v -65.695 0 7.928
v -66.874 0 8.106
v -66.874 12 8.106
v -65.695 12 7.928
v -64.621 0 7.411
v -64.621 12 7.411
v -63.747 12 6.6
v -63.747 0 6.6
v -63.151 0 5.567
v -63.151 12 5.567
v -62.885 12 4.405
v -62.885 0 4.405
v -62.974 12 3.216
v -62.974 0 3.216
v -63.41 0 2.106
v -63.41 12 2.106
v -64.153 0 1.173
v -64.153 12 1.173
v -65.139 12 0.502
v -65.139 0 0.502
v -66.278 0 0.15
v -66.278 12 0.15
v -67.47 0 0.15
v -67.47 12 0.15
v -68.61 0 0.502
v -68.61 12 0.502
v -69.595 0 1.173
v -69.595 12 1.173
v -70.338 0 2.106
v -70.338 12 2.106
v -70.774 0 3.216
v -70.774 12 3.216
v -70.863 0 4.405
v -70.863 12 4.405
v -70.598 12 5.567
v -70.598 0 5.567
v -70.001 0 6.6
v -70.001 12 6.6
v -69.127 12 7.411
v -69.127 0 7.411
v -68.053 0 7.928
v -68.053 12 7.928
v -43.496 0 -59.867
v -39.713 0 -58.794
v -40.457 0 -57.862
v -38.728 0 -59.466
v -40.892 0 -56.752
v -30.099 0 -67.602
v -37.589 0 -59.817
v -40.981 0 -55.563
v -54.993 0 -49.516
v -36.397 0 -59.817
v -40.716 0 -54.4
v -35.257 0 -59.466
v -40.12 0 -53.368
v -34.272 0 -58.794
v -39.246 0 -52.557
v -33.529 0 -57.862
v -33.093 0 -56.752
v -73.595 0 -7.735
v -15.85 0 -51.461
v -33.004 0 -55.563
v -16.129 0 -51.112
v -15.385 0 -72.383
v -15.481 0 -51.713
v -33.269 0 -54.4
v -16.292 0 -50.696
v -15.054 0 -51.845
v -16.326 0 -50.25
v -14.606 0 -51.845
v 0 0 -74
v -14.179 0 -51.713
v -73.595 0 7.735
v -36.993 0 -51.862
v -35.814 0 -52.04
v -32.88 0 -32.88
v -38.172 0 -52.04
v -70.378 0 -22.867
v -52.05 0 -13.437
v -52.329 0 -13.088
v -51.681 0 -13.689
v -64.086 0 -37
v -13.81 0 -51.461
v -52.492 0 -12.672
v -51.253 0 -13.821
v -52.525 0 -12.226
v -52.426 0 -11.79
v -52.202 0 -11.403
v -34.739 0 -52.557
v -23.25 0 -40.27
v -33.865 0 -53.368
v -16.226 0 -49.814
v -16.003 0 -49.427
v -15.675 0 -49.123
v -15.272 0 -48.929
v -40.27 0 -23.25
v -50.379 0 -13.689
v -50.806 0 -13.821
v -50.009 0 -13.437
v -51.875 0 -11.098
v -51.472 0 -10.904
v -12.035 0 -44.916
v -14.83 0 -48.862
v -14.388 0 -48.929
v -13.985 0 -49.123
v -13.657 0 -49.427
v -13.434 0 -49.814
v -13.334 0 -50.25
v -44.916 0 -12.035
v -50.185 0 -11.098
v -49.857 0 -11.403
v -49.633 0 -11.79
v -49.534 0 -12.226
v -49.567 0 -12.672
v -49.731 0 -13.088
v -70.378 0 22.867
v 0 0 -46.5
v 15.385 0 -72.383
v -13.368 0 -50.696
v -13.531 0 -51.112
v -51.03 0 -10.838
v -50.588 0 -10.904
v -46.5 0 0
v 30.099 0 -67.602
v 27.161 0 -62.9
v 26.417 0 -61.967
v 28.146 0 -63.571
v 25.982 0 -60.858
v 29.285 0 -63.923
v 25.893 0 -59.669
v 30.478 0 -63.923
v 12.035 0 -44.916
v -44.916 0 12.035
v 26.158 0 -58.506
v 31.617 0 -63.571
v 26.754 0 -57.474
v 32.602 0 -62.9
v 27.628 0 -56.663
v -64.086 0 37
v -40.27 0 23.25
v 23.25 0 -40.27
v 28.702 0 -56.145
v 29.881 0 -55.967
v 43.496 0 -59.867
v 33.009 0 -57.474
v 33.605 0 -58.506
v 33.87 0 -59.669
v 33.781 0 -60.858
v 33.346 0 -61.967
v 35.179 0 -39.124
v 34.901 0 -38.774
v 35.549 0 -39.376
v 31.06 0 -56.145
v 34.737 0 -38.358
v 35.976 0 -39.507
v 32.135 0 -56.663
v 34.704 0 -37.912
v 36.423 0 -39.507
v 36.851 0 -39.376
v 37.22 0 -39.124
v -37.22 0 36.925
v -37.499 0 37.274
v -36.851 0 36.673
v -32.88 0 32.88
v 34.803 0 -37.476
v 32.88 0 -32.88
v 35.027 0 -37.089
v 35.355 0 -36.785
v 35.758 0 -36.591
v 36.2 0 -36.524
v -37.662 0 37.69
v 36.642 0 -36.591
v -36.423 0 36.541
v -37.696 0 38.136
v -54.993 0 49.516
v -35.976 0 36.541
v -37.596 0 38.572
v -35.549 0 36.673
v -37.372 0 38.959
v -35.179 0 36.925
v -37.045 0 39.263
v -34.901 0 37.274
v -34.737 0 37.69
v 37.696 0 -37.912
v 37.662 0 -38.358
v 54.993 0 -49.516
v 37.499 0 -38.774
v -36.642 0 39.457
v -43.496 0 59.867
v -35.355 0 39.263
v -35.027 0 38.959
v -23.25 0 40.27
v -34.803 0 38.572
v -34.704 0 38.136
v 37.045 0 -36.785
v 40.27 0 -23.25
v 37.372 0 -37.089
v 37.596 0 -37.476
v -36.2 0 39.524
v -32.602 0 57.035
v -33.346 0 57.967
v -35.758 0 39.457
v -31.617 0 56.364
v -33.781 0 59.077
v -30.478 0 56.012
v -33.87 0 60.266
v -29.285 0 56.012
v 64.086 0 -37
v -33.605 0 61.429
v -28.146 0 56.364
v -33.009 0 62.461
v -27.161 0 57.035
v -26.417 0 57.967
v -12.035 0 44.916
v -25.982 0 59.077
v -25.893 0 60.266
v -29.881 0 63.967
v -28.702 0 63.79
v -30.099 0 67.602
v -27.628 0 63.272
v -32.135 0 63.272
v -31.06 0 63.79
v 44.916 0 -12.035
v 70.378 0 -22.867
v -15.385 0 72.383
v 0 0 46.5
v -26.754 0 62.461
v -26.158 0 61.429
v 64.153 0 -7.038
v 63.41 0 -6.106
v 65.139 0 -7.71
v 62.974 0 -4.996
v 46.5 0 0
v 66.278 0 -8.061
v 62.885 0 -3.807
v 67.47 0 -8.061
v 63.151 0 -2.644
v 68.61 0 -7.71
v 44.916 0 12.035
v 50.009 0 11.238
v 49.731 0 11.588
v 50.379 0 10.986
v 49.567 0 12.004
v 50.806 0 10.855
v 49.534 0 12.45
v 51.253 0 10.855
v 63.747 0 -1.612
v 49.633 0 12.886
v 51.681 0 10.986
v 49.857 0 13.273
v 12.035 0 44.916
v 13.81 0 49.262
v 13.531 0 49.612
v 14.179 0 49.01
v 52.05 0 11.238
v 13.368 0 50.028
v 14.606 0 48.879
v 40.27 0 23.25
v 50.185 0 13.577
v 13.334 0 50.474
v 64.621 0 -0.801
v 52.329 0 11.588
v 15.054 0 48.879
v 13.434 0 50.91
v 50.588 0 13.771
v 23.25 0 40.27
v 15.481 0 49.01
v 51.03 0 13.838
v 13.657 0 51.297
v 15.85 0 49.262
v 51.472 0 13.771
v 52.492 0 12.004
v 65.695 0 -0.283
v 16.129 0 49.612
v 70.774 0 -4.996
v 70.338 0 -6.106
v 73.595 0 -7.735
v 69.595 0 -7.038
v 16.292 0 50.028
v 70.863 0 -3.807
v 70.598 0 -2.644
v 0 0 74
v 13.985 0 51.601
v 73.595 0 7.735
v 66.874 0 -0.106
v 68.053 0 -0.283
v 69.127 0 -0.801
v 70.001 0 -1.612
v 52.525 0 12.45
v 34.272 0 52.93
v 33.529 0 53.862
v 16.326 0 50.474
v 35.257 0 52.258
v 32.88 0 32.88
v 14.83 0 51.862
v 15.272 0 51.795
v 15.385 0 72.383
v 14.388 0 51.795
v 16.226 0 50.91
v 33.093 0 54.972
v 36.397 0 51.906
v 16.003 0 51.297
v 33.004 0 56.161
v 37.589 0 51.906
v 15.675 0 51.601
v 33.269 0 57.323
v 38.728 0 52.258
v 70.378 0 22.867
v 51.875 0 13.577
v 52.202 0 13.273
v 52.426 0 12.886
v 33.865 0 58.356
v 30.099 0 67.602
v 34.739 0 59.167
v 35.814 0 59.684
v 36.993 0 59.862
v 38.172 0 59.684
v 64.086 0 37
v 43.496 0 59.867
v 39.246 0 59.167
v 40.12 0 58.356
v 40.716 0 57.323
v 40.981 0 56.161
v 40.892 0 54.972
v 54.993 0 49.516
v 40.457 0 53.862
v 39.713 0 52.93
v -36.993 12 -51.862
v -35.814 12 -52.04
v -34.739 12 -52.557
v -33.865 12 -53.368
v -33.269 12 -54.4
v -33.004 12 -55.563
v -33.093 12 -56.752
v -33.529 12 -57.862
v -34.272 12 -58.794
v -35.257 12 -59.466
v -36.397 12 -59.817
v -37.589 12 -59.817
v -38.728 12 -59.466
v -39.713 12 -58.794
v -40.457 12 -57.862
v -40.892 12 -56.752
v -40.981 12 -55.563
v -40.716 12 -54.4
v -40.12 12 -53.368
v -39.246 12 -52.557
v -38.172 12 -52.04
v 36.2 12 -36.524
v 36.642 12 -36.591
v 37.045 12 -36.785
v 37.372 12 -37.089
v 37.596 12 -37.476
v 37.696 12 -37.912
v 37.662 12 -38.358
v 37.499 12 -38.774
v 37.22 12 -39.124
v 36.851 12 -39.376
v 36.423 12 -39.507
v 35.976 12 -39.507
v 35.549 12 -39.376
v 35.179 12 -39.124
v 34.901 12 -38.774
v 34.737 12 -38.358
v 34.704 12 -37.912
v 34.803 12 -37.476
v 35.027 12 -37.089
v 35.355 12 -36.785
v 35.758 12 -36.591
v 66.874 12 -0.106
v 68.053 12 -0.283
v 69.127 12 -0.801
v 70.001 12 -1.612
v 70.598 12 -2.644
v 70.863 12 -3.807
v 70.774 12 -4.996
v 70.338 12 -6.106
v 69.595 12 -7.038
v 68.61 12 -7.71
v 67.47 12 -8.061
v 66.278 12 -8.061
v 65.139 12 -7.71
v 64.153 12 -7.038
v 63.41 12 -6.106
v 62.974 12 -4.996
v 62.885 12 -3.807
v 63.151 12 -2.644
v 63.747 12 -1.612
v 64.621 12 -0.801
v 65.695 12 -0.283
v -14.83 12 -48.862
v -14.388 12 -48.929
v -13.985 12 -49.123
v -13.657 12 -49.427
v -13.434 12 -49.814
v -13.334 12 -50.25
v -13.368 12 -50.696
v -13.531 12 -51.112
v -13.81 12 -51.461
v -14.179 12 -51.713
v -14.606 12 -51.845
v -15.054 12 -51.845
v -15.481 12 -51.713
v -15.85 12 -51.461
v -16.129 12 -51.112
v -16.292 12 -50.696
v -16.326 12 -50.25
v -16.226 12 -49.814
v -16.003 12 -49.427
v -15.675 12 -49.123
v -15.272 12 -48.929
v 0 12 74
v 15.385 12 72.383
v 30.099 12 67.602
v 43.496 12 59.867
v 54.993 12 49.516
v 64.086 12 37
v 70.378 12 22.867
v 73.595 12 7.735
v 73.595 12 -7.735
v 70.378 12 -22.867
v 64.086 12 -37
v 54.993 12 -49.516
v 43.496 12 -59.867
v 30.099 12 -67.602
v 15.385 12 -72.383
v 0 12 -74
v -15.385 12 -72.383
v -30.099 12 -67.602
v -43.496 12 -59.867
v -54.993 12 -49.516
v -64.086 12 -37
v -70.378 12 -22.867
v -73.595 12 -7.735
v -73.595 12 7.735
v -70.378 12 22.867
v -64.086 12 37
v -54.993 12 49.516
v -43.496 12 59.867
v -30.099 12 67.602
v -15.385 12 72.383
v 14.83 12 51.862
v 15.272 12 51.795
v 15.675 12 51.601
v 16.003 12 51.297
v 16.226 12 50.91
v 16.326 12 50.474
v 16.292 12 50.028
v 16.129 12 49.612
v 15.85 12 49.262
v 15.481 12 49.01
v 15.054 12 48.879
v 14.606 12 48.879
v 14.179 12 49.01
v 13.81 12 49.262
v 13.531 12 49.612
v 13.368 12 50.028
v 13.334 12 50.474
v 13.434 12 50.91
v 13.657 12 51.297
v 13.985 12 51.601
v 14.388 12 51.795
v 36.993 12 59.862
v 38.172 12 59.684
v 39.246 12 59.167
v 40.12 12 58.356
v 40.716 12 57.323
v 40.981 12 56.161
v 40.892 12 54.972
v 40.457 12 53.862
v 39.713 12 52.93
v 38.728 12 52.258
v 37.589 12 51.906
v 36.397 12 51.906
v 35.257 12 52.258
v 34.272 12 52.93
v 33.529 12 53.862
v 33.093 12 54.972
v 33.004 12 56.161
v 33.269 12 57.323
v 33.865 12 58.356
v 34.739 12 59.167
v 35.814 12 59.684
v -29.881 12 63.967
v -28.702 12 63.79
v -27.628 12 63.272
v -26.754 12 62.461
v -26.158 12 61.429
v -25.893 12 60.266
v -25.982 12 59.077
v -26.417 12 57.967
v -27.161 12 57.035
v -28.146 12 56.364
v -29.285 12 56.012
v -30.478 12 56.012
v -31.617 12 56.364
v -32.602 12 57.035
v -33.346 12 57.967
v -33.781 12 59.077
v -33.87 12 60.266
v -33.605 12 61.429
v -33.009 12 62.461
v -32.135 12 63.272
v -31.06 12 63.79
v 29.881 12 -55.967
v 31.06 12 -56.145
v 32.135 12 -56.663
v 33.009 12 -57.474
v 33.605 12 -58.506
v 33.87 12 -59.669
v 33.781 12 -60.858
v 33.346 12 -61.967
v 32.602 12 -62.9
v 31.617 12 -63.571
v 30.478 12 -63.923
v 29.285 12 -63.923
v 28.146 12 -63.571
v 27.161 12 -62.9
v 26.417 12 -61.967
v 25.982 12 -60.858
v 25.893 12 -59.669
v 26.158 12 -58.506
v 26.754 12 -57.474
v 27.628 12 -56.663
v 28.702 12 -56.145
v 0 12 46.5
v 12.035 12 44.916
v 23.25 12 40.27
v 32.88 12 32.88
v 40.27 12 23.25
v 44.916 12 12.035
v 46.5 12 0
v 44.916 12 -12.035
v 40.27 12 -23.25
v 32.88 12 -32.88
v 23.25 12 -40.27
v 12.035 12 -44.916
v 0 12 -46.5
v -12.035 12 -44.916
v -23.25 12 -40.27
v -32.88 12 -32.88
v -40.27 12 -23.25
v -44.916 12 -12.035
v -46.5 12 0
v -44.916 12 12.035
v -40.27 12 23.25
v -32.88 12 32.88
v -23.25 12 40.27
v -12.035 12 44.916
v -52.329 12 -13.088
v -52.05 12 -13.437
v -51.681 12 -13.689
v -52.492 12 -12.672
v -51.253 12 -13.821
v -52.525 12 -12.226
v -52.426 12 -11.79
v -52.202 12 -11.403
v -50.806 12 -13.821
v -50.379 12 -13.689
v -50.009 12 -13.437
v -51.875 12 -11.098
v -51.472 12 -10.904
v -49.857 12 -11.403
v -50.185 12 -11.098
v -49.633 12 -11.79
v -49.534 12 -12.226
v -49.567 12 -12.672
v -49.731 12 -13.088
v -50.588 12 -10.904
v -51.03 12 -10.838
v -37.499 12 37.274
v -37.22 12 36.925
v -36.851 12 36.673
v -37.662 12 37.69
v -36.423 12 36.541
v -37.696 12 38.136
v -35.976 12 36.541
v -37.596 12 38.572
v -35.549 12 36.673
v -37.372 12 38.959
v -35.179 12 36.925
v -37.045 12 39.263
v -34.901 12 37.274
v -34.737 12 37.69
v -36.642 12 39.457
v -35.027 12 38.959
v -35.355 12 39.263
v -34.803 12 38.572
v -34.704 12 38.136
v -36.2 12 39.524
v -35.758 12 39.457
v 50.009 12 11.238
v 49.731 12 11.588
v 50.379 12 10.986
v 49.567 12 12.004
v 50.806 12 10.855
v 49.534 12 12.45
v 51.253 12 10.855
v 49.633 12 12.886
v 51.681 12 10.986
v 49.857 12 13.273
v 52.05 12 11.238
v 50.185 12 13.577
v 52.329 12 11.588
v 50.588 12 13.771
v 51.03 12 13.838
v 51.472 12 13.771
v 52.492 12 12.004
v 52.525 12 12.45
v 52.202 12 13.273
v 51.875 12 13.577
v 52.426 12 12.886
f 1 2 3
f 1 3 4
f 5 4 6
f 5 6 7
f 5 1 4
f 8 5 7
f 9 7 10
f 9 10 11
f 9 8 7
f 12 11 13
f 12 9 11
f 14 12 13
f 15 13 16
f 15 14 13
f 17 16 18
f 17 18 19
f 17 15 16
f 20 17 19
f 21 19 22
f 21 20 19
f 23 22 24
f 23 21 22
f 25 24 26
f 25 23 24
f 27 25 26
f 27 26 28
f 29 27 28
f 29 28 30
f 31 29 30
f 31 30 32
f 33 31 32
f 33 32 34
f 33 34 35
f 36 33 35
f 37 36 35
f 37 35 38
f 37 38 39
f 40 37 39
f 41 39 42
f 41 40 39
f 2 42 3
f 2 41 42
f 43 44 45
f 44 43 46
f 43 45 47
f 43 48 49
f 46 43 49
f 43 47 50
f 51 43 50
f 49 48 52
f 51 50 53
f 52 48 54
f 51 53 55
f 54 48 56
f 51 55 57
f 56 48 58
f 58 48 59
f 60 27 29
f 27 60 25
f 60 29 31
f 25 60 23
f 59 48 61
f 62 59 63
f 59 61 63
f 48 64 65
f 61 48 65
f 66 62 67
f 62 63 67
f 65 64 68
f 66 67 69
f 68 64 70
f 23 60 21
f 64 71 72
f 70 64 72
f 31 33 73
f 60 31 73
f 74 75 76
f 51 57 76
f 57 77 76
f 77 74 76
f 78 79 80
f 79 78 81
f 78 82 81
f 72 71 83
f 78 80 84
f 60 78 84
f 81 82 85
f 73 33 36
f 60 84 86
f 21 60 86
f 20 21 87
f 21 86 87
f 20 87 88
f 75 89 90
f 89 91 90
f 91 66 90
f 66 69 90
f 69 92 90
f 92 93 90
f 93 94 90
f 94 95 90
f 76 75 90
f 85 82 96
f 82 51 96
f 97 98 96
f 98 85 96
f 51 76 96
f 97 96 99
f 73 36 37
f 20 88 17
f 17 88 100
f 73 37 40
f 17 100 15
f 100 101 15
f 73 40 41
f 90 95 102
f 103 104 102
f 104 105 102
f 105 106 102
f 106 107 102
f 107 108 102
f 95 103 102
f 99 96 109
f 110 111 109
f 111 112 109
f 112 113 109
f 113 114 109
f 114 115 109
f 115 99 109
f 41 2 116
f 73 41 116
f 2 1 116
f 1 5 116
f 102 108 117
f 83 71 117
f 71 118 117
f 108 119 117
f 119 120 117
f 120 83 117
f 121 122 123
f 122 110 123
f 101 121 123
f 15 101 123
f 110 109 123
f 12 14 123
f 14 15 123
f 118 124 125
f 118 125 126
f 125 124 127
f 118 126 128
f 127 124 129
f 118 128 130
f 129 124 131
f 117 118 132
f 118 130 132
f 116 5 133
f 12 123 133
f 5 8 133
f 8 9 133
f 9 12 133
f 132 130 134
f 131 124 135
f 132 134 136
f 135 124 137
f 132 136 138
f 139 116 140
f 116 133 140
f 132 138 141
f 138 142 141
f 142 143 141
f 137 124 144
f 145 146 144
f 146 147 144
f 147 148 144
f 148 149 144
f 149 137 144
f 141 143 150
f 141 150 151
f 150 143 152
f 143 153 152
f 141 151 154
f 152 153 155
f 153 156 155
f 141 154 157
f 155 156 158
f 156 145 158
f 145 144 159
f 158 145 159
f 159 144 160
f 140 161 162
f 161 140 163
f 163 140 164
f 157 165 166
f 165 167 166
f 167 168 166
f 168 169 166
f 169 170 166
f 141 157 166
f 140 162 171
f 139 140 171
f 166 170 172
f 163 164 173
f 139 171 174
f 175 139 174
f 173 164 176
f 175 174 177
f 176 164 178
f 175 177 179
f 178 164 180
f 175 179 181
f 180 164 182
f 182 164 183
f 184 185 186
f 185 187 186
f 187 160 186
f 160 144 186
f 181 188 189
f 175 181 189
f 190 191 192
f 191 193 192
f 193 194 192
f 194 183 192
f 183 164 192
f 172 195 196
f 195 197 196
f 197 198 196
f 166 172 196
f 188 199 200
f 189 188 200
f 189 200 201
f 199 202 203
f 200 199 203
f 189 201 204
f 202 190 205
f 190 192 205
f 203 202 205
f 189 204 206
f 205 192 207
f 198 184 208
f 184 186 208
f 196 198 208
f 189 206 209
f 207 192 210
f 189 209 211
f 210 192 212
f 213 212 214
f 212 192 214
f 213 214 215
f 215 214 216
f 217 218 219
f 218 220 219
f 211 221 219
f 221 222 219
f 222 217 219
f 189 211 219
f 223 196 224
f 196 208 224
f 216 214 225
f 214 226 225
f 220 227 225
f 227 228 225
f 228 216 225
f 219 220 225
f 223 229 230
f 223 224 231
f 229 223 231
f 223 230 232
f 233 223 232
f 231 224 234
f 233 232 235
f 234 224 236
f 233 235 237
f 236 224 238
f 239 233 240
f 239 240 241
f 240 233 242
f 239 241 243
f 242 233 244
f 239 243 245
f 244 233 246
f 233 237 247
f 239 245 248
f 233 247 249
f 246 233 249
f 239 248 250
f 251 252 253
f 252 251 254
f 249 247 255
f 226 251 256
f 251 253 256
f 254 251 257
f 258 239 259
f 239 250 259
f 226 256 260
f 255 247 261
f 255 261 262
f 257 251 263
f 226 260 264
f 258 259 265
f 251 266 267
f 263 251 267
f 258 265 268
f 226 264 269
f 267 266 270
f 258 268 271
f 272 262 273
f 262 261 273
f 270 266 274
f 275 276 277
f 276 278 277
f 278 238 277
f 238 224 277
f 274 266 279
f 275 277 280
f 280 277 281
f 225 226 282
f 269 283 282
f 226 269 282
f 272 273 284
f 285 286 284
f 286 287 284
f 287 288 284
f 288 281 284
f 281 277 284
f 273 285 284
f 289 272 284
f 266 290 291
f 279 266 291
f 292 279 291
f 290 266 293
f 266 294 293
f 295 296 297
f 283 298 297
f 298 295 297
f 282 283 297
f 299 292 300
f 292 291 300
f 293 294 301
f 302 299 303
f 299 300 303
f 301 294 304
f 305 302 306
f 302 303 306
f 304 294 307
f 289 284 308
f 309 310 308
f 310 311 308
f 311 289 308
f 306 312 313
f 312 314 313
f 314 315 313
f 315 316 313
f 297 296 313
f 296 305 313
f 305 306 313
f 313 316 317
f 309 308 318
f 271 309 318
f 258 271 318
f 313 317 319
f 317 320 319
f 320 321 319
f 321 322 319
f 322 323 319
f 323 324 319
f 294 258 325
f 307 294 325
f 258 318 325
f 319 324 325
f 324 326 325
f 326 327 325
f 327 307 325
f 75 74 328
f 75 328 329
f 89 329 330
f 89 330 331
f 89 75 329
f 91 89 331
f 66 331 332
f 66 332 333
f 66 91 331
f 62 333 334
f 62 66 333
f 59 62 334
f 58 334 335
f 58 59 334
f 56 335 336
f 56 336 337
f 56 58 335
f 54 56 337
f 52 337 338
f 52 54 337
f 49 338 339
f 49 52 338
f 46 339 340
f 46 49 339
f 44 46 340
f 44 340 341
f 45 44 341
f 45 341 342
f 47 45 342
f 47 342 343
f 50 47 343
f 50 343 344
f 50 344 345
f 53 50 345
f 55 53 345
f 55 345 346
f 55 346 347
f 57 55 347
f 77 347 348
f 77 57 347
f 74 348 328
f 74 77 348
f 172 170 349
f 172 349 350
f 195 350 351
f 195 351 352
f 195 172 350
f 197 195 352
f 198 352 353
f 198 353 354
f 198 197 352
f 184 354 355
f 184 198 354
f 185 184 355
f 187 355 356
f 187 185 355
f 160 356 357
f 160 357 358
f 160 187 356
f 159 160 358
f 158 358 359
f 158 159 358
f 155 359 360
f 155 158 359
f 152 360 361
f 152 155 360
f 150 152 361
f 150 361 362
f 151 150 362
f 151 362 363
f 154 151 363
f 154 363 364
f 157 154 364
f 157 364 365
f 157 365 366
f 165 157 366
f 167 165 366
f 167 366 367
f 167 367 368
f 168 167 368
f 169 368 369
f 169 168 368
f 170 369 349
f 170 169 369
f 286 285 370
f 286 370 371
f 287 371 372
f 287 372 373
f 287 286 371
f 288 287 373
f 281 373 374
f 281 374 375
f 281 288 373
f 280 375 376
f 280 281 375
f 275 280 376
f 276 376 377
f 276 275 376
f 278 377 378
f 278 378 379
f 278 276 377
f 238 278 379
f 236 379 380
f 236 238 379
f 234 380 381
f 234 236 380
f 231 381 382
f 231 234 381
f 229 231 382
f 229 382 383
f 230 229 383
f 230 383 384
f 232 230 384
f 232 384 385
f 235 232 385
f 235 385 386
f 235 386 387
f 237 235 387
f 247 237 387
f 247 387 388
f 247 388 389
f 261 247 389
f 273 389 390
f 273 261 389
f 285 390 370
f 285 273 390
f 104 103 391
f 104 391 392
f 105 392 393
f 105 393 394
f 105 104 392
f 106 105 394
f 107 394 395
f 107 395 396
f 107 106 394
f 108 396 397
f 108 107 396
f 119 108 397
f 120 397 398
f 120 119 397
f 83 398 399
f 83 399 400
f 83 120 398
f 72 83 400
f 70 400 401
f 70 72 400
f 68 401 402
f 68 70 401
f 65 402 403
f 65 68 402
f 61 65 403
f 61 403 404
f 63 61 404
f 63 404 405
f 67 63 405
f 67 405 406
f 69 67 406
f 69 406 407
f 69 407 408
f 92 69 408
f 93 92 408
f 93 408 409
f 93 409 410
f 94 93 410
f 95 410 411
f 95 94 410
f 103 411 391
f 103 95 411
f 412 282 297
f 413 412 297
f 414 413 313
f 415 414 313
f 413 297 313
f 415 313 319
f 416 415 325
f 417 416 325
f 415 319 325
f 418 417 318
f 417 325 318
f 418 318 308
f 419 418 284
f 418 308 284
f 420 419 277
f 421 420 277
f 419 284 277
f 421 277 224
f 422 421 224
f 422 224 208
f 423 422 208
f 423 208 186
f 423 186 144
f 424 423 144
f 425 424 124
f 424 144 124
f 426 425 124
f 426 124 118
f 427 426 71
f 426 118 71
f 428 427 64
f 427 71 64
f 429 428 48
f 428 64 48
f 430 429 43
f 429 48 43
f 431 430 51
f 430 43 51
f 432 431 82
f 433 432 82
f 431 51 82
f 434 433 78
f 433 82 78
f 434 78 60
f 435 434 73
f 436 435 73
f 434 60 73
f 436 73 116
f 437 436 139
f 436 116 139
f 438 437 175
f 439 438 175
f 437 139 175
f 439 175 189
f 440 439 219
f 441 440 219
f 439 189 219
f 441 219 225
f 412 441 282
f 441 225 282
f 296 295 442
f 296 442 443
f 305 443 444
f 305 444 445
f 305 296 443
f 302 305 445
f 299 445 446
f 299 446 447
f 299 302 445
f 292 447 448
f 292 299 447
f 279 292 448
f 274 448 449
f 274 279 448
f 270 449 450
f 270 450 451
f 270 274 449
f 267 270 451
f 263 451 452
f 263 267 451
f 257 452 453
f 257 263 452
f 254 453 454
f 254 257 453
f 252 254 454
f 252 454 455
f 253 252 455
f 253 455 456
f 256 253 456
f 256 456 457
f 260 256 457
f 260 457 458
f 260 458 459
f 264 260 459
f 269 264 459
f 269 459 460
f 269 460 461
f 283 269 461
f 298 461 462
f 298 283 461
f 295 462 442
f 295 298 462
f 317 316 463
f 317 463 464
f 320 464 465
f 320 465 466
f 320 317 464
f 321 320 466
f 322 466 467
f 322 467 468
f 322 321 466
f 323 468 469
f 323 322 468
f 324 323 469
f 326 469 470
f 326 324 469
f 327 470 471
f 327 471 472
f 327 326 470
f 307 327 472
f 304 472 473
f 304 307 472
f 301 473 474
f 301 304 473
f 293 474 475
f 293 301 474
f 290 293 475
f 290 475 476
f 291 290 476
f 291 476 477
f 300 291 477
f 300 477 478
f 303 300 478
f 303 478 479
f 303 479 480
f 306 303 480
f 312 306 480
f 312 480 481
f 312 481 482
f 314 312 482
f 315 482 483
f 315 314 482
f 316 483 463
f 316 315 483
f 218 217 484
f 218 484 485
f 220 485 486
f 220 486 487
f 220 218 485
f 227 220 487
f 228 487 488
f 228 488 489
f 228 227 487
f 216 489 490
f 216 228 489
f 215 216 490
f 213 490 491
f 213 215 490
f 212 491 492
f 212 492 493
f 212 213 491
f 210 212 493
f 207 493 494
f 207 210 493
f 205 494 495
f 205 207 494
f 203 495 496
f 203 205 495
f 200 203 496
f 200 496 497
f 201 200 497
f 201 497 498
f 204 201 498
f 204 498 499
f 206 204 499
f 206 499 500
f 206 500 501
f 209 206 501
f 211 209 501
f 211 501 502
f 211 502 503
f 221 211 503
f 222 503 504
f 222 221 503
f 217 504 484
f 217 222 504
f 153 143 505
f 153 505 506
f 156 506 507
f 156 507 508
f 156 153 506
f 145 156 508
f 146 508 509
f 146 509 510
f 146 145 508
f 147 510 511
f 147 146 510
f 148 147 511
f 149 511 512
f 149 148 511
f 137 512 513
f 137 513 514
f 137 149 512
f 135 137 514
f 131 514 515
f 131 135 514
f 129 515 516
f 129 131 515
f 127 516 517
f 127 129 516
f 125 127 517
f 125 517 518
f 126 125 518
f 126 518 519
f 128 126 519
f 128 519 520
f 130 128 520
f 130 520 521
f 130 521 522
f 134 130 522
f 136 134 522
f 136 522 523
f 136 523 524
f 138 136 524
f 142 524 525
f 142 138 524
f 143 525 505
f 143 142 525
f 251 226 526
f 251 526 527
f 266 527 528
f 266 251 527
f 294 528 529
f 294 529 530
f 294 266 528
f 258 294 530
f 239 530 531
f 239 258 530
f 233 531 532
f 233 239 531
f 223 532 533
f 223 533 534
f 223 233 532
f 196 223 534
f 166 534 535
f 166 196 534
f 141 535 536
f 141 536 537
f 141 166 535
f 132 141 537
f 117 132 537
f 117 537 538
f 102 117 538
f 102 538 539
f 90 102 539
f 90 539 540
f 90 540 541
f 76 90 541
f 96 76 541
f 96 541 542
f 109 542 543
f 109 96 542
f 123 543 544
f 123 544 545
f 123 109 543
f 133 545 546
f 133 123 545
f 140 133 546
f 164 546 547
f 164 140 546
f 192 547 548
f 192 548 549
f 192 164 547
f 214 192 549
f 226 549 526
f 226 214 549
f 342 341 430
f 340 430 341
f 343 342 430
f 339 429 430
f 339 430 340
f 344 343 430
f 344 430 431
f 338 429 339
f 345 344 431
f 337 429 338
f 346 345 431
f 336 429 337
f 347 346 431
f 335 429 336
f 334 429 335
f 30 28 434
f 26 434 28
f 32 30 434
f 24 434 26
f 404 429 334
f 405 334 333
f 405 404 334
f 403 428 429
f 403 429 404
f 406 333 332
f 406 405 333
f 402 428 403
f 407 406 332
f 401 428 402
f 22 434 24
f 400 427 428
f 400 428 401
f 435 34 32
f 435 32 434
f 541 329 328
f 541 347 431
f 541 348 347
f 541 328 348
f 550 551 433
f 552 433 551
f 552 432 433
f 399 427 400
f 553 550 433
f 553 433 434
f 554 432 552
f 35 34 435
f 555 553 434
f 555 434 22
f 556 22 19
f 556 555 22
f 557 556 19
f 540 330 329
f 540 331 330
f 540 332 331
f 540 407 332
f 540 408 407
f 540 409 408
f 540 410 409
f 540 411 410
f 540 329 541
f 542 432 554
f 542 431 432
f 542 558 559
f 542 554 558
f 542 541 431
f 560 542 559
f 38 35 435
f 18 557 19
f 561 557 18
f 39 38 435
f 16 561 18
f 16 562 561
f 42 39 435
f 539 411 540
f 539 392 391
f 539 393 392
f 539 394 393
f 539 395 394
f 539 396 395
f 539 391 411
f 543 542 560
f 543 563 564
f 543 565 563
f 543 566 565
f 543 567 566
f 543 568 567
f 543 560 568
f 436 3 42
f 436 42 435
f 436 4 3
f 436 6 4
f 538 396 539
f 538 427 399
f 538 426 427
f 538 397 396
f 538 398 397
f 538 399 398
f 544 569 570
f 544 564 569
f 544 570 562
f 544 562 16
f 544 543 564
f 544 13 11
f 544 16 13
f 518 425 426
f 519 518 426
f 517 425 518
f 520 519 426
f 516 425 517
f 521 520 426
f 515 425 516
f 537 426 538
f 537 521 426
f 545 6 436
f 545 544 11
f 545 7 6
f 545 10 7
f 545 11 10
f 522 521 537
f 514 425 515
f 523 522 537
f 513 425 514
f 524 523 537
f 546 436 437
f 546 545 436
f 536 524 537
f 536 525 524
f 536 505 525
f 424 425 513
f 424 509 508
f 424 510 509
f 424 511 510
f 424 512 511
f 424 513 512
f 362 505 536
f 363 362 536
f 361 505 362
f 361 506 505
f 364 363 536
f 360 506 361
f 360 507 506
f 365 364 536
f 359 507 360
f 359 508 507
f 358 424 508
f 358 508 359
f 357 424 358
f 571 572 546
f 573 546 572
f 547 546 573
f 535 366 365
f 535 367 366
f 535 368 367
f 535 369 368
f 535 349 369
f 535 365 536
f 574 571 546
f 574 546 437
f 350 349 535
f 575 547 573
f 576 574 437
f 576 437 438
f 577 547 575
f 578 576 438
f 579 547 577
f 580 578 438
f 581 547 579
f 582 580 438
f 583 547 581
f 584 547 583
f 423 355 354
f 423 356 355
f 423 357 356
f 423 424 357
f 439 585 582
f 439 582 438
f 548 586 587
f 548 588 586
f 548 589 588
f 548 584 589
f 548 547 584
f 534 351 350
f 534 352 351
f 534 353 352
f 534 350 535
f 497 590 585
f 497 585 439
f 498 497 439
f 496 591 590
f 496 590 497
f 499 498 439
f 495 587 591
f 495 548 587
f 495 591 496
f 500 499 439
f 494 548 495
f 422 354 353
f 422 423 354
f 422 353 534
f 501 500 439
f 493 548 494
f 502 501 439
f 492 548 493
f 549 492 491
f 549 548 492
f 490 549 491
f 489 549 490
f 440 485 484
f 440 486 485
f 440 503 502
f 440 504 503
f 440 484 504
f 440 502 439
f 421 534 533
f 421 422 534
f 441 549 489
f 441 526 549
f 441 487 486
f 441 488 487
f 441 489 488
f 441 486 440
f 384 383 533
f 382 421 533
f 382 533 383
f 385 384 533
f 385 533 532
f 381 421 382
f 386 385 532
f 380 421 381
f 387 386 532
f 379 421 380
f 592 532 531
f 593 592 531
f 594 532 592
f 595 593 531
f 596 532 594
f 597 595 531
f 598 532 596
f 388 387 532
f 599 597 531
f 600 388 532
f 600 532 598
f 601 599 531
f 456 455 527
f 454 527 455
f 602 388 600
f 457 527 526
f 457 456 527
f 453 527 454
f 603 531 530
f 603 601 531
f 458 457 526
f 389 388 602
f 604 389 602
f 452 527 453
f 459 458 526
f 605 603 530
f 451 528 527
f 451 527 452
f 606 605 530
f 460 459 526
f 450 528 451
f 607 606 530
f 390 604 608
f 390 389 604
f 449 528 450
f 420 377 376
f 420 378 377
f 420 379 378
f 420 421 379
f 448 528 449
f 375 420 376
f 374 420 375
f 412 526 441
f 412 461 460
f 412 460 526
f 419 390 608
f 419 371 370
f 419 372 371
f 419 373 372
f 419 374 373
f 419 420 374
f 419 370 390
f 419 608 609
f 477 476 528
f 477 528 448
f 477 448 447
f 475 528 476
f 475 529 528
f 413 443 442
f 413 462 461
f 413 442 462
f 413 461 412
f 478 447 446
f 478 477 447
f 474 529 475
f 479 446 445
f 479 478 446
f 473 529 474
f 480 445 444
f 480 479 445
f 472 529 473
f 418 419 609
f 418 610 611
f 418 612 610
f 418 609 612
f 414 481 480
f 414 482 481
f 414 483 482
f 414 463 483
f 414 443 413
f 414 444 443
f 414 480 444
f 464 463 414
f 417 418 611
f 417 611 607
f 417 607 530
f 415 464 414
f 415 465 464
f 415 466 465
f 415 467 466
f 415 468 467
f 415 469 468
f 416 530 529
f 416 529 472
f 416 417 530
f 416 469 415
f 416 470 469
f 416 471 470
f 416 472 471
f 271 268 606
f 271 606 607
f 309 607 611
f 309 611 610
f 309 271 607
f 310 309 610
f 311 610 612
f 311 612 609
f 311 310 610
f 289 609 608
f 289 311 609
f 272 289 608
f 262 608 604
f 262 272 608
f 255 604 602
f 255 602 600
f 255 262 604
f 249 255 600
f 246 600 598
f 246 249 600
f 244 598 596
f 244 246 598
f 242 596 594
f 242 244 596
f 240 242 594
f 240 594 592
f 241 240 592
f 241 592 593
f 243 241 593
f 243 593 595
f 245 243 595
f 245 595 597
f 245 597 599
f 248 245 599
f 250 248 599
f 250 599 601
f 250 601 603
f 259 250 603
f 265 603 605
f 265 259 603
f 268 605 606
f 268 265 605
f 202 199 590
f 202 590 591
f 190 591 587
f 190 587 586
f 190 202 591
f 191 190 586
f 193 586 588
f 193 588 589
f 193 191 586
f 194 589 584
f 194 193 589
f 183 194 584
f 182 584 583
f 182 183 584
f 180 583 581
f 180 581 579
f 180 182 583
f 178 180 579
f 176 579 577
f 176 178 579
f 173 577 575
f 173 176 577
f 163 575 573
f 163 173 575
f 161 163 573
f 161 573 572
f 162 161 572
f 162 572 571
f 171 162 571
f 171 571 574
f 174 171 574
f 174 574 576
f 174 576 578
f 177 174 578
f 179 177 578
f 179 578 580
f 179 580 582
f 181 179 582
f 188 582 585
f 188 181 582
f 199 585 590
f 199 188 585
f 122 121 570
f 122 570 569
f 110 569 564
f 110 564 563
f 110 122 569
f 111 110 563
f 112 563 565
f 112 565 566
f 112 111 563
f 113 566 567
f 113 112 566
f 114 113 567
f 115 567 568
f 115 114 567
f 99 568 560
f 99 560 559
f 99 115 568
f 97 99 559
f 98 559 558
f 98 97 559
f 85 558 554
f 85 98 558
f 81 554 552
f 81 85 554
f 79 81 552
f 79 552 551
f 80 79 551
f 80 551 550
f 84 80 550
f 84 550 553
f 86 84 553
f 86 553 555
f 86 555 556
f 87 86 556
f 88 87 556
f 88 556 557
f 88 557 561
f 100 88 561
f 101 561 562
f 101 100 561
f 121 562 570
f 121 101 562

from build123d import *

# Parameters (mm, degrees)
SKETCH_1_R      = 74
SKETCH_1_R_2    = 46.5
SKETCH_1_R_3    = 1.5
SKETCH_1_R_4    = 4
EXTRUDE_2_DEPTH = 12


with BuildPart() as part:
    # 草图1 → 凸台-拉伸2 (new body)
    with BuildSketch(Plane(origin=(0, 0, 0), x_dir=(1, 0, 0), z_dir=(0, 1, 0))):
        with Locations(Location((0, 0, 0), (0, 0, 270))):
            Circle(SKETCH_1_R)
        with Locations(Location((0, 0, 0), (0, 0, 270))):
            Circle(SKETCH_1_R_2, mode=Mode.SUBTRACT)
        with Locations(Location((36.199702934, 38.024091146, 0), (0, 0, 270))):
            Circle(SKETCH_1_R_3, mode=Mode.SUBTRACT)
        with Locations(Location((29.881416045, 59.967499324, 0), (0, 0, 270))):
            Circle(SKETCH_1_R_4, mode=Mode.SUBTRACT)
        with Locations(Location((66.874085838, 4.105684266, 0), (0, 0, 270))):
            Circle(SKETCH_1_R_4, mode=Mode.SUBTRACT)
        with Locations(Location((51.029680355, -12.337816778, 0), (0, 0, 270))):
            Circle(SKETCH_1_R_3, mode=Mode.SUBTRACT)
        with Locations(Location((36.992669793, -55.861815058, 0), (0, 0, 270))):
            Circle(SKETCH_1_R_4, mode=Mode.SUBTRACT)
        with Locations(Location((14.829977421, -50.361907923, 0), (0, 0, 270))):
            Circle(SKETCH_1_R_3, mode=Mode.SUBTRACT)
        with Locations(Location((-29.881416045, -59.967499324, 0), (0, 0, 270))):
            Circle(SKETCH_1_R_4, mode=Mode.SUBTRACT)
        with Locations(Location((-36.199702934, -38.024091146, 0), (0, 0, 270))):
            Circle(SKETCH_1_R_3, mode=Mode.SUBTRACT)
        with Locations(Location((-66.874085838, -4.105684266, 0), (0, 0, 270))):
            Circle(SKETCH_1_R_4, mode=Mode.SUBTRACT)
        with Locations(Location((-51.029680355, 12.337816778, 0), (0, 0, 270))):
            Circle(SKETCH_1_R_3, mode=Mode.SUBTRACT)
        with Locations(Location((-36.992669793, 55.861815058, 0), (0, 0, 270))):
            Circle(SKETCH_1_R_4, mode=Mode.SUBTRACT)
        with Locations(Location((-14.829977421, 50.361907923, 0), (0, 0, 270))):
            Circle(SKETCH_1_R_3, mode=Mode.SUBTRACT)
    extrude(amount=EXTRUDE_2_DEPTH)


solid = part.part
